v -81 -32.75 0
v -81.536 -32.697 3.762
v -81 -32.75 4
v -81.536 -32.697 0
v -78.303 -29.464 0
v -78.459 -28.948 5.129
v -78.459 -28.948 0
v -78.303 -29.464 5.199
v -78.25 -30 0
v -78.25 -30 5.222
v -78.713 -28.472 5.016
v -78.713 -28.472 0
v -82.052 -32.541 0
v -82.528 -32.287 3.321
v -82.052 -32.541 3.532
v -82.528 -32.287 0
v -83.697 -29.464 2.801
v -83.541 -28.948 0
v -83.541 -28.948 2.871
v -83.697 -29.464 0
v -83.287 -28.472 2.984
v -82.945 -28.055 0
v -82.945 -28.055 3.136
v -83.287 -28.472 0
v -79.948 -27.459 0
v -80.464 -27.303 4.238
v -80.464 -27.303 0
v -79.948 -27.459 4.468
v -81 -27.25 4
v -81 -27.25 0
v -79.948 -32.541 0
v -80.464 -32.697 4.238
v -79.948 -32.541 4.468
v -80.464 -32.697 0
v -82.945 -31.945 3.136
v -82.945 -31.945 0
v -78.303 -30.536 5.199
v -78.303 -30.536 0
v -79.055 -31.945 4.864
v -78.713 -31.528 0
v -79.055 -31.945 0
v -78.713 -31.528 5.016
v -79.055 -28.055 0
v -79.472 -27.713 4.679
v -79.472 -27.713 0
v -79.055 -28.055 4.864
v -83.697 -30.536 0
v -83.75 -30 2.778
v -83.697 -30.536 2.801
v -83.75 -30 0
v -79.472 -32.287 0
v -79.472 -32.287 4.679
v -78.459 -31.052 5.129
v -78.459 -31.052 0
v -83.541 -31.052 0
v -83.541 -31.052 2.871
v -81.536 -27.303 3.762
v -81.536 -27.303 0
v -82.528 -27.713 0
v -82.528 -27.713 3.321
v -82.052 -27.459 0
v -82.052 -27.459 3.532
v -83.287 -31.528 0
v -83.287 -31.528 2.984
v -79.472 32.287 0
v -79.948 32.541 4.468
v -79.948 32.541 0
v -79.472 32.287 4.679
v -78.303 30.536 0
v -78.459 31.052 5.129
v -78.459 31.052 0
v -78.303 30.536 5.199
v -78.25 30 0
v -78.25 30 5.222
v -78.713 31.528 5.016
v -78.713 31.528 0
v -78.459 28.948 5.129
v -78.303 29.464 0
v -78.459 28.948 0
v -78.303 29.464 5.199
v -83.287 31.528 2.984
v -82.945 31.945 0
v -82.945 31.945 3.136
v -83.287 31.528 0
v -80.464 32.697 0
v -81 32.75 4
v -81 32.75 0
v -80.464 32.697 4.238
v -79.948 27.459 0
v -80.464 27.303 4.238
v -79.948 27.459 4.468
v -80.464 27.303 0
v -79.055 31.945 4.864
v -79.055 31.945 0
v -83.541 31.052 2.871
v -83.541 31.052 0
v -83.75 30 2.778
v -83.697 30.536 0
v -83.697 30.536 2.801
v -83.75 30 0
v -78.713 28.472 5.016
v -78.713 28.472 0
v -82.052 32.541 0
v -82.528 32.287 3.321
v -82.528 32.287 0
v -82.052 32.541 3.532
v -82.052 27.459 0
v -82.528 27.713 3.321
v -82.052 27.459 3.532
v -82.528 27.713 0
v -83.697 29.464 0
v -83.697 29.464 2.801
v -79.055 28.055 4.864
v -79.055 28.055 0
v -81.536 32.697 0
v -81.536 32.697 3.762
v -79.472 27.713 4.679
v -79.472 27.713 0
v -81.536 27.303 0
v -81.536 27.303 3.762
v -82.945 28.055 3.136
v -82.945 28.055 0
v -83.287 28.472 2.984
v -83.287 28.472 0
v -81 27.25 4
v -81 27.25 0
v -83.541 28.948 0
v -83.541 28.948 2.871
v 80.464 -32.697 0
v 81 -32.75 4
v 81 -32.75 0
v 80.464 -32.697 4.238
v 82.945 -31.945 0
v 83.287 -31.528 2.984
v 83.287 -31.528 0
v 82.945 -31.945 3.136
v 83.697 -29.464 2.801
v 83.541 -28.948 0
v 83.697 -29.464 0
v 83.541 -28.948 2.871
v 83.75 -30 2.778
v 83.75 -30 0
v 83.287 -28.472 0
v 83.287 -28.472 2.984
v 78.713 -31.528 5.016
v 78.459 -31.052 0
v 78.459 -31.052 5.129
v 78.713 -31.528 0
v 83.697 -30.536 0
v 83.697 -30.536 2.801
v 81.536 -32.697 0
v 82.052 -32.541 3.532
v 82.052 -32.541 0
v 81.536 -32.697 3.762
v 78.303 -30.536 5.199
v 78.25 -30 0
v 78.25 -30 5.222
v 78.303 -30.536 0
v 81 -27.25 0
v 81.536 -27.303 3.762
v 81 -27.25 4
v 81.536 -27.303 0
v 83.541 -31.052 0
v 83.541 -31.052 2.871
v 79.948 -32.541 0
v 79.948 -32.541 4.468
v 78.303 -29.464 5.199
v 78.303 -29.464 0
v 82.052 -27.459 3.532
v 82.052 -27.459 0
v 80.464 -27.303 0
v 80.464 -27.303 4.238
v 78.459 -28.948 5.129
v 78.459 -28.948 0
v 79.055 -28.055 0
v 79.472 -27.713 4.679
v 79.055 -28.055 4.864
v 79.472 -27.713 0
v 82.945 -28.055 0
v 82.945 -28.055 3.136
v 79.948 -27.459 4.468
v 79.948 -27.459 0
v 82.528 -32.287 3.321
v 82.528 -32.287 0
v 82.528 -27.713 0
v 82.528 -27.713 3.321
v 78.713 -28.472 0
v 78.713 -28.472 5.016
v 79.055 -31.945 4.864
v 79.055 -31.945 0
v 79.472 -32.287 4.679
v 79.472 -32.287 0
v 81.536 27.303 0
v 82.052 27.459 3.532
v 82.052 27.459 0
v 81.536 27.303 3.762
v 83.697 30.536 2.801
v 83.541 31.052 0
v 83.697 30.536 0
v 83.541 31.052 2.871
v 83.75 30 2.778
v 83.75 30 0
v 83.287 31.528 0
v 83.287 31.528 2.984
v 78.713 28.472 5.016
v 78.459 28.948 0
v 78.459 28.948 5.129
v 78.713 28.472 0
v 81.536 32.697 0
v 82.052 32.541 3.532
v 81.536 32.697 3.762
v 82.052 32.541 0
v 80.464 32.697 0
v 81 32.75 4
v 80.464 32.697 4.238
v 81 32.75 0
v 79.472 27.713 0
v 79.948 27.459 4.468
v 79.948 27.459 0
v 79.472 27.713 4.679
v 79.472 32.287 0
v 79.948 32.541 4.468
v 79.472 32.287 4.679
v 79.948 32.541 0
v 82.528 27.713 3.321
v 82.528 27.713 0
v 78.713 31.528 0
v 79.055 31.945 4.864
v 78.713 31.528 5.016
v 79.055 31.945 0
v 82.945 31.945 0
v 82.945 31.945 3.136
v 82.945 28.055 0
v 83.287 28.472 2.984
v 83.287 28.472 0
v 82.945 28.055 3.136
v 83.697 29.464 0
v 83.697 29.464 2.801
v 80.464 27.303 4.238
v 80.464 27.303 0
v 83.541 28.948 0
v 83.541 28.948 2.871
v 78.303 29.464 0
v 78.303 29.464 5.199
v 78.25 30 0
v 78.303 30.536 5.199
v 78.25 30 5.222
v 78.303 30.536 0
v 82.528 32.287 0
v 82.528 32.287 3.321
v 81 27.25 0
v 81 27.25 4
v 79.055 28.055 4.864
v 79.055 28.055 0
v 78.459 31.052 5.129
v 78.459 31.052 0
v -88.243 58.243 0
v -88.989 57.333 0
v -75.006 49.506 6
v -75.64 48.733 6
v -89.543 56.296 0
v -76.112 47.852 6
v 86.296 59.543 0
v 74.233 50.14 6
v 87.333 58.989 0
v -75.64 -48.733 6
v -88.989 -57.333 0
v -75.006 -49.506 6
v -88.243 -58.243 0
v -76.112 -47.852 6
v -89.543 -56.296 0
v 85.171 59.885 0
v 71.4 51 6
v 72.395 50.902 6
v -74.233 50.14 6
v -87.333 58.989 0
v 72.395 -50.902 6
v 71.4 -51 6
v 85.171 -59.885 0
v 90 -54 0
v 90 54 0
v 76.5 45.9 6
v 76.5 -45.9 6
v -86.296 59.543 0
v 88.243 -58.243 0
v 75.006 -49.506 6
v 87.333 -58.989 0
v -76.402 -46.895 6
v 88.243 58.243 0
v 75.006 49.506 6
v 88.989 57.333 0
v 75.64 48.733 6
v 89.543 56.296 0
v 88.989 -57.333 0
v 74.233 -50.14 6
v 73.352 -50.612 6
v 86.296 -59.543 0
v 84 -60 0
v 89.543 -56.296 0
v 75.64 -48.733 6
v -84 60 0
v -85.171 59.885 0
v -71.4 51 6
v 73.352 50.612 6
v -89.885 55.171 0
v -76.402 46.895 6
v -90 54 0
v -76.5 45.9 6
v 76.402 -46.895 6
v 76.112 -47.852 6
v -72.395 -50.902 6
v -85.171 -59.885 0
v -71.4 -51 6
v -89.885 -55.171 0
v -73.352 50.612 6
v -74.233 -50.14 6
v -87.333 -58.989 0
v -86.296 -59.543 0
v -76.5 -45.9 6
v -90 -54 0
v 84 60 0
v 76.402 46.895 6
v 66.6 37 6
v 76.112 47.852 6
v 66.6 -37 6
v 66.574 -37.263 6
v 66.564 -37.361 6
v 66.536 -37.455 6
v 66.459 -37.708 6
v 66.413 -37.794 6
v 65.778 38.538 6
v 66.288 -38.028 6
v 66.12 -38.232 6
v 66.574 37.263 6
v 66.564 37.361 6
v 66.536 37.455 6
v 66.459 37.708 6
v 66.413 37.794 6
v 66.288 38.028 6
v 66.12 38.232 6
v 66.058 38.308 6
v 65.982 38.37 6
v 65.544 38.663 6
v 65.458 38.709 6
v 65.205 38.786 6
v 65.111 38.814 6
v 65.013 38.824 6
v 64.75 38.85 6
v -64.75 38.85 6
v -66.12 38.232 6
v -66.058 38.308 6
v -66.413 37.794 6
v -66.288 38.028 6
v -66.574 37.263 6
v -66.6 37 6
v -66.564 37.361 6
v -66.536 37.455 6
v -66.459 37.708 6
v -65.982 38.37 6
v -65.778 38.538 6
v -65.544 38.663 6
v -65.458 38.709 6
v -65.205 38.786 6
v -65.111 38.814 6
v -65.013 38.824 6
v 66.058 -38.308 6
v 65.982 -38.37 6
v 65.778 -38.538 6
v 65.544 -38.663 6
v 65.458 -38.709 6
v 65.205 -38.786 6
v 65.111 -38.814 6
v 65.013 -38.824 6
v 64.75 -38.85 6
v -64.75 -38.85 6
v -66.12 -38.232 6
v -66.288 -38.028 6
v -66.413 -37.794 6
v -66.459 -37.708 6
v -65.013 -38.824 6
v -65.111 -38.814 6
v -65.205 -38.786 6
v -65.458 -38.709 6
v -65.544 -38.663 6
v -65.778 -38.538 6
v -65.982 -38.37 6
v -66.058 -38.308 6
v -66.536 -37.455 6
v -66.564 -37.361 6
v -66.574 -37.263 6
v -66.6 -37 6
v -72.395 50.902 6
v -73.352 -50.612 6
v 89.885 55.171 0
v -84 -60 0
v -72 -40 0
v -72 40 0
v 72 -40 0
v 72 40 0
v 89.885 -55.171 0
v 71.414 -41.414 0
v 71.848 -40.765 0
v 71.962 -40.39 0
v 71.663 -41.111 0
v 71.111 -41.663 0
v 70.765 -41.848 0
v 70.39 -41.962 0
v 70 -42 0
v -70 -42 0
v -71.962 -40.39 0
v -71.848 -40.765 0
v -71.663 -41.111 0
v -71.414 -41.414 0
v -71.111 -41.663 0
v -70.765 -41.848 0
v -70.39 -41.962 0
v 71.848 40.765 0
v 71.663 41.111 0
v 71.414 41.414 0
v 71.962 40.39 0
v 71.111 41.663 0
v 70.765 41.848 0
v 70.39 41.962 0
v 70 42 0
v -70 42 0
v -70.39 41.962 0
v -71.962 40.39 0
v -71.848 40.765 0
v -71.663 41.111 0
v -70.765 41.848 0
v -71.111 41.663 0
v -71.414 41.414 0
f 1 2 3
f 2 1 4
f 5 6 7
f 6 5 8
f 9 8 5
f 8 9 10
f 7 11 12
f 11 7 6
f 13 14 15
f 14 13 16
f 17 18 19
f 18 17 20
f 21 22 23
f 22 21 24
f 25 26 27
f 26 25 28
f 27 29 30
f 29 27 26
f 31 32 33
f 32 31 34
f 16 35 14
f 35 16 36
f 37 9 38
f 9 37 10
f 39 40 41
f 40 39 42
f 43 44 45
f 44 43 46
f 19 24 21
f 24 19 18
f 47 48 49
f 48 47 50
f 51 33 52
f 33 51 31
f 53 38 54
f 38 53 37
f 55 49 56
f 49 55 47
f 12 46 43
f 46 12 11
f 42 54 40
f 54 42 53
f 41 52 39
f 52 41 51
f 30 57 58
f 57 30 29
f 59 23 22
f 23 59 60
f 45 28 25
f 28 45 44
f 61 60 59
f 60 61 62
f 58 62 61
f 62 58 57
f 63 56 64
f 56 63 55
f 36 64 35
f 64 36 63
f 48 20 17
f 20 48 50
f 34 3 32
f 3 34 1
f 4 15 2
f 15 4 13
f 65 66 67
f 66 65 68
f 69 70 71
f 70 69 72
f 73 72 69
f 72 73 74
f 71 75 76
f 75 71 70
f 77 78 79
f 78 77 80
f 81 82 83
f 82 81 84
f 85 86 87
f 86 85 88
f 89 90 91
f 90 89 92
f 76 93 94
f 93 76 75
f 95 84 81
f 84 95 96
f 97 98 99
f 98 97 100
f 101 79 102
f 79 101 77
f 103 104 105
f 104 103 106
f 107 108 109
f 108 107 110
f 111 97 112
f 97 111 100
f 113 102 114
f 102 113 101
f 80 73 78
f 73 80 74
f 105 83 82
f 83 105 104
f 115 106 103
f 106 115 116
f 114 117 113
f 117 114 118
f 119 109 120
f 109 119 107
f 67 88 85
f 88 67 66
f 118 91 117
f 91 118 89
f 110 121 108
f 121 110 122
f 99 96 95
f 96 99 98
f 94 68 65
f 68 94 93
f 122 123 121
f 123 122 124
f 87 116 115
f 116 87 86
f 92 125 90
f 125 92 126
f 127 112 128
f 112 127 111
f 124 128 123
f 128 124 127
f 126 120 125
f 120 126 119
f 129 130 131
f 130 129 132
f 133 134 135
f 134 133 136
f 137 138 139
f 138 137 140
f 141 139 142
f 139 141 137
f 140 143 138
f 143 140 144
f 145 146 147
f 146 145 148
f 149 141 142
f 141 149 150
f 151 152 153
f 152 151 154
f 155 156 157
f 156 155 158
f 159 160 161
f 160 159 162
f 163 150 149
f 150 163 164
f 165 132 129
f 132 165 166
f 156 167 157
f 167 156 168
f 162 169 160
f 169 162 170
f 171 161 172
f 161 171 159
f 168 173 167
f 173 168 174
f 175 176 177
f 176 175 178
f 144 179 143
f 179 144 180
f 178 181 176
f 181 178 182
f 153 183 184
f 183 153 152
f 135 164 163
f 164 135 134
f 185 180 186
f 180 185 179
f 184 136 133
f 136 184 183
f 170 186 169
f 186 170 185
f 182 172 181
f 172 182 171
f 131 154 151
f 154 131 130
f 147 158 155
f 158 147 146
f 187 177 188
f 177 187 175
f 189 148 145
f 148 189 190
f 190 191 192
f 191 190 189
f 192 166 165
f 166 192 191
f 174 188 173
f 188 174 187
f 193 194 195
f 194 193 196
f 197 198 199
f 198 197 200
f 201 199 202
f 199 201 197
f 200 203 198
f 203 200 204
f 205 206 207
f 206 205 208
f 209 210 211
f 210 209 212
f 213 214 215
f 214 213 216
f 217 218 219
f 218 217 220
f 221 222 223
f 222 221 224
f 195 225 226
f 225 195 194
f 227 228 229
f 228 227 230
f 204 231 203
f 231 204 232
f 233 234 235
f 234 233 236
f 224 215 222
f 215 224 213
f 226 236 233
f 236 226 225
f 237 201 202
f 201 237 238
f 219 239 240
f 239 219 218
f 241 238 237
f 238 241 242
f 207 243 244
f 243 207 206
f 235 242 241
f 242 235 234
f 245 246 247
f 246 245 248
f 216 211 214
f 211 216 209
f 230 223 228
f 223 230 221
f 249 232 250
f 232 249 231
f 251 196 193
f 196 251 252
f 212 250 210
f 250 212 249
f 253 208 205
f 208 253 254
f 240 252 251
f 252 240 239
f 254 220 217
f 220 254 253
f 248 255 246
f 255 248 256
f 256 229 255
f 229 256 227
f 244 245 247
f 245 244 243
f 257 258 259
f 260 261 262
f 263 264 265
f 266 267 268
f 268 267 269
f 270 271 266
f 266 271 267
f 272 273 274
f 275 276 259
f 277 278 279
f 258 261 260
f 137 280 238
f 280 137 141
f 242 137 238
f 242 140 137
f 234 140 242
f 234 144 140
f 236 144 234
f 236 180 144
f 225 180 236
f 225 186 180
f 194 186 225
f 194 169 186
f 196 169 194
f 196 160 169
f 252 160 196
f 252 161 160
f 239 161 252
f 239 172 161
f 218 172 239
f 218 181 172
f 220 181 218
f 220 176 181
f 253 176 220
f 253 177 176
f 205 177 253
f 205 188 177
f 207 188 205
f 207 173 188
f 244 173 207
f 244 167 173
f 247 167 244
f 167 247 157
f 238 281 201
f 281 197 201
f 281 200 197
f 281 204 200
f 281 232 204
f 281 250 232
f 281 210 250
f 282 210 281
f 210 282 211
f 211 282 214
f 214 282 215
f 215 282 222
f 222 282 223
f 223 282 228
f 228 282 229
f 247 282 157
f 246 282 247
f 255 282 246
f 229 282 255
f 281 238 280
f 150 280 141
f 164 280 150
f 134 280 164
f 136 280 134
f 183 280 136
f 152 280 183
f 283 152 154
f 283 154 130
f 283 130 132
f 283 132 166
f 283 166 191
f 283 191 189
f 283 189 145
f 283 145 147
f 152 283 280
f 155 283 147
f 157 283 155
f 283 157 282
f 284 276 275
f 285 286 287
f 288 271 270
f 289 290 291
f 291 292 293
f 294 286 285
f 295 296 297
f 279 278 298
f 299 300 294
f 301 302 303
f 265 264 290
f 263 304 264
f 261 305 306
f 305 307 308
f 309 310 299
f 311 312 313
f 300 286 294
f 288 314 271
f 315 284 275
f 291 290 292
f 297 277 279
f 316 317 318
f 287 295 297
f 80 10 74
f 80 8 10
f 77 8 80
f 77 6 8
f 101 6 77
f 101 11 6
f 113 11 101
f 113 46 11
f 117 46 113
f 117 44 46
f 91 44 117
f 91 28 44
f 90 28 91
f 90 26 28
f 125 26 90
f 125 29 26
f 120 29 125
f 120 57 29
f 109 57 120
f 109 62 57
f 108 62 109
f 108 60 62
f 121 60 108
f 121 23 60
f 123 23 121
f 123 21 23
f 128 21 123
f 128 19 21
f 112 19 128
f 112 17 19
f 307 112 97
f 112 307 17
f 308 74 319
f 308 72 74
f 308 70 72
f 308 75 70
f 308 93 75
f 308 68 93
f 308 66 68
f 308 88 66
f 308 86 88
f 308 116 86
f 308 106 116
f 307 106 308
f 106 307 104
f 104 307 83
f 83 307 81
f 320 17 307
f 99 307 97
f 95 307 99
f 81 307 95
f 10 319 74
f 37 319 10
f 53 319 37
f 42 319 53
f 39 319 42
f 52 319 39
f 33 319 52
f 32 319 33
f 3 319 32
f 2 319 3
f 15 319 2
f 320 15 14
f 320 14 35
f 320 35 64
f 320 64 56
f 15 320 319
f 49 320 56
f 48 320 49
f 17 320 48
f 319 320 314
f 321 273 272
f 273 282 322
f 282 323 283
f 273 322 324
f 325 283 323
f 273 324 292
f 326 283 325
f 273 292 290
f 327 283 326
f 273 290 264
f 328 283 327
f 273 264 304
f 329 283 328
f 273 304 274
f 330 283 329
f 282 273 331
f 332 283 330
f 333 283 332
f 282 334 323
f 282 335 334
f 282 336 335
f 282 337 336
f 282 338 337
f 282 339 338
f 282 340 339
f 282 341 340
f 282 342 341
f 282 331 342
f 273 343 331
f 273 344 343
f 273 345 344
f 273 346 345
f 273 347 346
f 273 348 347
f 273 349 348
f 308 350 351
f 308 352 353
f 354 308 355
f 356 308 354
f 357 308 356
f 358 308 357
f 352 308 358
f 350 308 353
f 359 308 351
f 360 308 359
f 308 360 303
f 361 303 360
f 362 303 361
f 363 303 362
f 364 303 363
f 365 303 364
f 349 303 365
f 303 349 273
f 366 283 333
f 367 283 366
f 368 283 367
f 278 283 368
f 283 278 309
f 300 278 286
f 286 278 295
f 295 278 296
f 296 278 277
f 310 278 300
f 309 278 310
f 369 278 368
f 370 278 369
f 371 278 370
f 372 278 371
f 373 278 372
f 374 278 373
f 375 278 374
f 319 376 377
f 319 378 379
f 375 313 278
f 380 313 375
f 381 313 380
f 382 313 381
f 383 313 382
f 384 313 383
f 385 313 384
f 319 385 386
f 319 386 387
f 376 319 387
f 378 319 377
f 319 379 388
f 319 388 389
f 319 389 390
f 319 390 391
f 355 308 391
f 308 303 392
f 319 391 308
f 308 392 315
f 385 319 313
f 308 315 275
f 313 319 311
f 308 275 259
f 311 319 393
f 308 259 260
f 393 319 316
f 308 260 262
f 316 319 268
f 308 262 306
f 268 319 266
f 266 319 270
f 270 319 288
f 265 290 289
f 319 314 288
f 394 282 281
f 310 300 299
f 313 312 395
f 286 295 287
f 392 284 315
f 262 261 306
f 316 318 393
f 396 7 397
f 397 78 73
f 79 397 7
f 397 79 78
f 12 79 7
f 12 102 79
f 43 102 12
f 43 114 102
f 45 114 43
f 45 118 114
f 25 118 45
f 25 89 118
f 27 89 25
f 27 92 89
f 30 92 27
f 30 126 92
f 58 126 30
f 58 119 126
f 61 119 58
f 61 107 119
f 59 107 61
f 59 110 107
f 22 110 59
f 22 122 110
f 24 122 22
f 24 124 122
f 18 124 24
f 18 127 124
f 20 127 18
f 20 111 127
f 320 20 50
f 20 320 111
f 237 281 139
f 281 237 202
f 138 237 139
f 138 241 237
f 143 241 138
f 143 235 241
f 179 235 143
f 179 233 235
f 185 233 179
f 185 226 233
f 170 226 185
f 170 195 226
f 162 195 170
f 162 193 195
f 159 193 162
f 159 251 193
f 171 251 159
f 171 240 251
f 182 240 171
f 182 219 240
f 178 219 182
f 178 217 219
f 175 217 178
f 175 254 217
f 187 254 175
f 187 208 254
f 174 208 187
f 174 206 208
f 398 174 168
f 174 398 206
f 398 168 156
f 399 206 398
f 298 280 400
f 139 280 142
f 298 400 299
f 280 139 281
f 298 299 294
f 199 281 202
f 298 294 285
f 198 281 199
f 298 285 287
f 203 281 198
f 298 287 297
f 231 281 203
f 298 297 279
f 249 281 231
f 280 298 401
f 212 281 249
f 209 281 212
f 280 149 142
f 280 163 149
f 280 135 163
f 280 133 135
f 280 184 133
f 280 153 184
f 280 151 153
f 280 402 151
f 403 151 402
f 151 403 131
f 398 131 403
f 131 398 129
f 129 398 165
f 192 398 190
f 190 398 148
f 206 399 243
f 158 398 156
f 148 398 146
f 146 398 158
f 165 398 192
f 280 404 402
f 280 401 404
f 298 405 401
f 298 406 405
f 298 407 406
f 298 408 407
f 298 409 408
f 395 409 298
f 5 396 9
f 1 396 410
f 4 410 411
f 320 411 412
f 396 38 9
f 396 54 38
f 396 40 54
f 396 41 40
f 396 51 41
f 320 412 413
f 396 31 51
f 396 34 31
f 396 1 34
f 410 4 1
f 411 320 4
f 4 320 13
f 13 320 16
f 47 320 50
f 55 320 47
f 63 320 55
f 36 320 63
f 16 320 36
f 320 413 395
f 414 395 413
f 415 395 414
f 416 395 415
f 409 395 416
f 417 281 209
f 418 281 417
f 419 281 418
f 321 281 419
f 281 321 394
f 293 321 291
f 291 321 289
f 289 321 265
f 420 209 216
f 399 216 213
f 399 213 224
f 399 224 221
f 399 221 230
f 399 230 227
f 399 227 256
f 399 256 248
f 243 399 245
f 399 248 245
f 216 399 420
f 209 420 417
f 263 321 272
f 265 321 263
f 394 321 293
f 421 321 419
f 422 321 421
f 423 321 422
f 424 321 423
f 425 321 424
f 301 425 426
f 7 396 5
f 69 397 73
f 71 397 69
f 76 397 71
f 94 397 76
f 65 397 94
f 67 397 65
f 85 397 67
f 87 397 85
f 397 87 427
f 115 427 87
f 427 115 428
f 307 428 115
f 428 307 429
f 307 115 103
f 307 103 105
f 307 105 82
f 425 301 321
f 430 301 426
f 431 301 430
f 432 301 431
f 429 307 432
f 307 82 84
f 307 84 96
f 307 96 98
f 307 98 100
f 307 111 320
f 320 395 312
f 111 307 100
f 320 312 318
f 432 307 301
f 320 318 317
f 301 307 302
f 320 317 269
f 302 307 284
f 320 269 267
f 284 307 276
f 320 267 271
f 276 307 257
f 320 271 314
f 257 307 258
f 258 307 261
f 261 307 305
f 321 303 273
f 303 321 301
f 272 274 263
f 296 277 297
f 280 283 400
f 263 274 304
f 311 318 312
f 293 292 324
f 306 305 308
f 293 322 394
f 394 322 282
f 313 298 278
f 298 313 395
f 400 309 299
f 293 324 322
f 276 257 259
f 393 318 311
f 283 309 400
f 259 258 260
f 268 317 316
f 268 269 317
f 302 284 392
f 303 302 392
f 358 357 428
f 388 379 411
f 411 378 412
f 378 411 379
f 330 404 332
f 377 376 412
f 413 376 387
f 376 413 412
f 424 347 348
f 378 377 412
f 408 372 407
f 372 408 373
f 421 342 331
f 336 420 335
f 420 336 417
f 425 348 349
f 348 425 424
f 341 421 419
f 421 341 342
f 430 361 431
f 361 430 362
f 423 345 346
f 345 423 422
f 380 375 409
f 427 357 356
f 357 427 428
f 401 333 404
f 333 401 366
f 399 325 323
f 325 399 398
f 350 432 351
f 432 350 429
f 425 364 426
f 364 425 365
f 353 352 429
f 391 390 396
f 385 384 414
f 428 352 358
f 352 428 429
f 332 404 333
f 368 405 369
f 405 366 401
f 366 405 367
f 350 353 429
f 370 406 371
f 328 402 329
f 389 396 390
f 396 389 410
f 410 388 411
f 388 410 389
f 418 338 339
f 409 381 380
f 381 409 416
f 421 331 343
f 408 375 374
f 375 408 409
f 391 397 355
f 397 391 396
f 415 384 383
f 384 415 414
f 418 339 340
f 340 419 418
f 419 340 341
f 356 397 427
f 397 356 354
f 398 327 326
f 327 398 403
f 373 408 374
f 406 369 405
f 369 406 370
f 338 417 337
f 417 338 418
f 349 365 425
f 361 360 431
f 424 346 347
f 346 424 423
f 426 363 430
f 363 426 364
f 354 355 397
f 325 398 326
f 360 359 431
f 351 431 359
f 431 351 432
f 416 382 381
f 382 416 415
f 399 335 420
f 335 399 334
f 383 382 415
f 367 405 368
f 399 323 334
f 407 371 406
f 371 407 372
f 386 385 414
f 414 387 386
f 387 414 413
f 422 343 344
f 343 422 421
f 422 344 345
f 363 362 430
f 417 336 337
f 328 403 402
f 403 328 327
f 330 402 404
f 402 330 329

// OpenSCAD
$fn = 32;

// ----------------------------------------------------------------------
// Display bezel: 180 x 120 mm frame, opening 144x84 mm
// ----------------------------------------------------------------------

// --- parameters (mm) ---
length = 180;             // frame outside length, X
width = 120;              // frame outside width, Y
frame_w = 18;             // frame width
thickness = 6;            // frame thickness
corner_r = 6;             // outside corner radius
chamfer = 0.85;           // outer wall taper
funnel = 0.9;             // inner opening taper
opening_l = 144;          // opening length
opening_w = 84;           // opening width
inner_r = 2;              // opening corner radius
hole_d = 5.5;             // mounting screw clearance
holes_per_side = 2;       // holes per short side
hole_inset = 9;           // hole centre inset from the outside edge

/* rounded-rectangle outlines, generated with loops */
module rounded_ring(l_nom, w_nom, r) {
  hull() {
    for (sx = [-1, 1]) for (sy = [-1, 1])
      translate([sx * (l_nom / 2 - r), sy * (w_nom / 2 - r)]) circle(r = r);
  }
}

difference() {
  /* frame body, drafted so the outer edge is a variable-depth chamfer */
  linear_extrude(height = thickness, scale = chamfer)
    rounded_ring(length, width, corner_r);
  /* viewing opening, drafted the other way for a funnel edge */
  linear_extrude(height = thickness + 2, scale = funnel)
    translate([0, 0, -1]) rounded_ring(opening_l, opening_w, inner_r);
  /* mounting screws through the frame lands */
  for (sx = [-1, 1]) for (i = [1 : holes_per_side])
    translate([sx * (length / 2 - hole_inset),
               (i - (holes_per_side + 1) / 2) * width * 0.5, -1])
      cylinder(h = thickness + 2, d = hole_d);
}
